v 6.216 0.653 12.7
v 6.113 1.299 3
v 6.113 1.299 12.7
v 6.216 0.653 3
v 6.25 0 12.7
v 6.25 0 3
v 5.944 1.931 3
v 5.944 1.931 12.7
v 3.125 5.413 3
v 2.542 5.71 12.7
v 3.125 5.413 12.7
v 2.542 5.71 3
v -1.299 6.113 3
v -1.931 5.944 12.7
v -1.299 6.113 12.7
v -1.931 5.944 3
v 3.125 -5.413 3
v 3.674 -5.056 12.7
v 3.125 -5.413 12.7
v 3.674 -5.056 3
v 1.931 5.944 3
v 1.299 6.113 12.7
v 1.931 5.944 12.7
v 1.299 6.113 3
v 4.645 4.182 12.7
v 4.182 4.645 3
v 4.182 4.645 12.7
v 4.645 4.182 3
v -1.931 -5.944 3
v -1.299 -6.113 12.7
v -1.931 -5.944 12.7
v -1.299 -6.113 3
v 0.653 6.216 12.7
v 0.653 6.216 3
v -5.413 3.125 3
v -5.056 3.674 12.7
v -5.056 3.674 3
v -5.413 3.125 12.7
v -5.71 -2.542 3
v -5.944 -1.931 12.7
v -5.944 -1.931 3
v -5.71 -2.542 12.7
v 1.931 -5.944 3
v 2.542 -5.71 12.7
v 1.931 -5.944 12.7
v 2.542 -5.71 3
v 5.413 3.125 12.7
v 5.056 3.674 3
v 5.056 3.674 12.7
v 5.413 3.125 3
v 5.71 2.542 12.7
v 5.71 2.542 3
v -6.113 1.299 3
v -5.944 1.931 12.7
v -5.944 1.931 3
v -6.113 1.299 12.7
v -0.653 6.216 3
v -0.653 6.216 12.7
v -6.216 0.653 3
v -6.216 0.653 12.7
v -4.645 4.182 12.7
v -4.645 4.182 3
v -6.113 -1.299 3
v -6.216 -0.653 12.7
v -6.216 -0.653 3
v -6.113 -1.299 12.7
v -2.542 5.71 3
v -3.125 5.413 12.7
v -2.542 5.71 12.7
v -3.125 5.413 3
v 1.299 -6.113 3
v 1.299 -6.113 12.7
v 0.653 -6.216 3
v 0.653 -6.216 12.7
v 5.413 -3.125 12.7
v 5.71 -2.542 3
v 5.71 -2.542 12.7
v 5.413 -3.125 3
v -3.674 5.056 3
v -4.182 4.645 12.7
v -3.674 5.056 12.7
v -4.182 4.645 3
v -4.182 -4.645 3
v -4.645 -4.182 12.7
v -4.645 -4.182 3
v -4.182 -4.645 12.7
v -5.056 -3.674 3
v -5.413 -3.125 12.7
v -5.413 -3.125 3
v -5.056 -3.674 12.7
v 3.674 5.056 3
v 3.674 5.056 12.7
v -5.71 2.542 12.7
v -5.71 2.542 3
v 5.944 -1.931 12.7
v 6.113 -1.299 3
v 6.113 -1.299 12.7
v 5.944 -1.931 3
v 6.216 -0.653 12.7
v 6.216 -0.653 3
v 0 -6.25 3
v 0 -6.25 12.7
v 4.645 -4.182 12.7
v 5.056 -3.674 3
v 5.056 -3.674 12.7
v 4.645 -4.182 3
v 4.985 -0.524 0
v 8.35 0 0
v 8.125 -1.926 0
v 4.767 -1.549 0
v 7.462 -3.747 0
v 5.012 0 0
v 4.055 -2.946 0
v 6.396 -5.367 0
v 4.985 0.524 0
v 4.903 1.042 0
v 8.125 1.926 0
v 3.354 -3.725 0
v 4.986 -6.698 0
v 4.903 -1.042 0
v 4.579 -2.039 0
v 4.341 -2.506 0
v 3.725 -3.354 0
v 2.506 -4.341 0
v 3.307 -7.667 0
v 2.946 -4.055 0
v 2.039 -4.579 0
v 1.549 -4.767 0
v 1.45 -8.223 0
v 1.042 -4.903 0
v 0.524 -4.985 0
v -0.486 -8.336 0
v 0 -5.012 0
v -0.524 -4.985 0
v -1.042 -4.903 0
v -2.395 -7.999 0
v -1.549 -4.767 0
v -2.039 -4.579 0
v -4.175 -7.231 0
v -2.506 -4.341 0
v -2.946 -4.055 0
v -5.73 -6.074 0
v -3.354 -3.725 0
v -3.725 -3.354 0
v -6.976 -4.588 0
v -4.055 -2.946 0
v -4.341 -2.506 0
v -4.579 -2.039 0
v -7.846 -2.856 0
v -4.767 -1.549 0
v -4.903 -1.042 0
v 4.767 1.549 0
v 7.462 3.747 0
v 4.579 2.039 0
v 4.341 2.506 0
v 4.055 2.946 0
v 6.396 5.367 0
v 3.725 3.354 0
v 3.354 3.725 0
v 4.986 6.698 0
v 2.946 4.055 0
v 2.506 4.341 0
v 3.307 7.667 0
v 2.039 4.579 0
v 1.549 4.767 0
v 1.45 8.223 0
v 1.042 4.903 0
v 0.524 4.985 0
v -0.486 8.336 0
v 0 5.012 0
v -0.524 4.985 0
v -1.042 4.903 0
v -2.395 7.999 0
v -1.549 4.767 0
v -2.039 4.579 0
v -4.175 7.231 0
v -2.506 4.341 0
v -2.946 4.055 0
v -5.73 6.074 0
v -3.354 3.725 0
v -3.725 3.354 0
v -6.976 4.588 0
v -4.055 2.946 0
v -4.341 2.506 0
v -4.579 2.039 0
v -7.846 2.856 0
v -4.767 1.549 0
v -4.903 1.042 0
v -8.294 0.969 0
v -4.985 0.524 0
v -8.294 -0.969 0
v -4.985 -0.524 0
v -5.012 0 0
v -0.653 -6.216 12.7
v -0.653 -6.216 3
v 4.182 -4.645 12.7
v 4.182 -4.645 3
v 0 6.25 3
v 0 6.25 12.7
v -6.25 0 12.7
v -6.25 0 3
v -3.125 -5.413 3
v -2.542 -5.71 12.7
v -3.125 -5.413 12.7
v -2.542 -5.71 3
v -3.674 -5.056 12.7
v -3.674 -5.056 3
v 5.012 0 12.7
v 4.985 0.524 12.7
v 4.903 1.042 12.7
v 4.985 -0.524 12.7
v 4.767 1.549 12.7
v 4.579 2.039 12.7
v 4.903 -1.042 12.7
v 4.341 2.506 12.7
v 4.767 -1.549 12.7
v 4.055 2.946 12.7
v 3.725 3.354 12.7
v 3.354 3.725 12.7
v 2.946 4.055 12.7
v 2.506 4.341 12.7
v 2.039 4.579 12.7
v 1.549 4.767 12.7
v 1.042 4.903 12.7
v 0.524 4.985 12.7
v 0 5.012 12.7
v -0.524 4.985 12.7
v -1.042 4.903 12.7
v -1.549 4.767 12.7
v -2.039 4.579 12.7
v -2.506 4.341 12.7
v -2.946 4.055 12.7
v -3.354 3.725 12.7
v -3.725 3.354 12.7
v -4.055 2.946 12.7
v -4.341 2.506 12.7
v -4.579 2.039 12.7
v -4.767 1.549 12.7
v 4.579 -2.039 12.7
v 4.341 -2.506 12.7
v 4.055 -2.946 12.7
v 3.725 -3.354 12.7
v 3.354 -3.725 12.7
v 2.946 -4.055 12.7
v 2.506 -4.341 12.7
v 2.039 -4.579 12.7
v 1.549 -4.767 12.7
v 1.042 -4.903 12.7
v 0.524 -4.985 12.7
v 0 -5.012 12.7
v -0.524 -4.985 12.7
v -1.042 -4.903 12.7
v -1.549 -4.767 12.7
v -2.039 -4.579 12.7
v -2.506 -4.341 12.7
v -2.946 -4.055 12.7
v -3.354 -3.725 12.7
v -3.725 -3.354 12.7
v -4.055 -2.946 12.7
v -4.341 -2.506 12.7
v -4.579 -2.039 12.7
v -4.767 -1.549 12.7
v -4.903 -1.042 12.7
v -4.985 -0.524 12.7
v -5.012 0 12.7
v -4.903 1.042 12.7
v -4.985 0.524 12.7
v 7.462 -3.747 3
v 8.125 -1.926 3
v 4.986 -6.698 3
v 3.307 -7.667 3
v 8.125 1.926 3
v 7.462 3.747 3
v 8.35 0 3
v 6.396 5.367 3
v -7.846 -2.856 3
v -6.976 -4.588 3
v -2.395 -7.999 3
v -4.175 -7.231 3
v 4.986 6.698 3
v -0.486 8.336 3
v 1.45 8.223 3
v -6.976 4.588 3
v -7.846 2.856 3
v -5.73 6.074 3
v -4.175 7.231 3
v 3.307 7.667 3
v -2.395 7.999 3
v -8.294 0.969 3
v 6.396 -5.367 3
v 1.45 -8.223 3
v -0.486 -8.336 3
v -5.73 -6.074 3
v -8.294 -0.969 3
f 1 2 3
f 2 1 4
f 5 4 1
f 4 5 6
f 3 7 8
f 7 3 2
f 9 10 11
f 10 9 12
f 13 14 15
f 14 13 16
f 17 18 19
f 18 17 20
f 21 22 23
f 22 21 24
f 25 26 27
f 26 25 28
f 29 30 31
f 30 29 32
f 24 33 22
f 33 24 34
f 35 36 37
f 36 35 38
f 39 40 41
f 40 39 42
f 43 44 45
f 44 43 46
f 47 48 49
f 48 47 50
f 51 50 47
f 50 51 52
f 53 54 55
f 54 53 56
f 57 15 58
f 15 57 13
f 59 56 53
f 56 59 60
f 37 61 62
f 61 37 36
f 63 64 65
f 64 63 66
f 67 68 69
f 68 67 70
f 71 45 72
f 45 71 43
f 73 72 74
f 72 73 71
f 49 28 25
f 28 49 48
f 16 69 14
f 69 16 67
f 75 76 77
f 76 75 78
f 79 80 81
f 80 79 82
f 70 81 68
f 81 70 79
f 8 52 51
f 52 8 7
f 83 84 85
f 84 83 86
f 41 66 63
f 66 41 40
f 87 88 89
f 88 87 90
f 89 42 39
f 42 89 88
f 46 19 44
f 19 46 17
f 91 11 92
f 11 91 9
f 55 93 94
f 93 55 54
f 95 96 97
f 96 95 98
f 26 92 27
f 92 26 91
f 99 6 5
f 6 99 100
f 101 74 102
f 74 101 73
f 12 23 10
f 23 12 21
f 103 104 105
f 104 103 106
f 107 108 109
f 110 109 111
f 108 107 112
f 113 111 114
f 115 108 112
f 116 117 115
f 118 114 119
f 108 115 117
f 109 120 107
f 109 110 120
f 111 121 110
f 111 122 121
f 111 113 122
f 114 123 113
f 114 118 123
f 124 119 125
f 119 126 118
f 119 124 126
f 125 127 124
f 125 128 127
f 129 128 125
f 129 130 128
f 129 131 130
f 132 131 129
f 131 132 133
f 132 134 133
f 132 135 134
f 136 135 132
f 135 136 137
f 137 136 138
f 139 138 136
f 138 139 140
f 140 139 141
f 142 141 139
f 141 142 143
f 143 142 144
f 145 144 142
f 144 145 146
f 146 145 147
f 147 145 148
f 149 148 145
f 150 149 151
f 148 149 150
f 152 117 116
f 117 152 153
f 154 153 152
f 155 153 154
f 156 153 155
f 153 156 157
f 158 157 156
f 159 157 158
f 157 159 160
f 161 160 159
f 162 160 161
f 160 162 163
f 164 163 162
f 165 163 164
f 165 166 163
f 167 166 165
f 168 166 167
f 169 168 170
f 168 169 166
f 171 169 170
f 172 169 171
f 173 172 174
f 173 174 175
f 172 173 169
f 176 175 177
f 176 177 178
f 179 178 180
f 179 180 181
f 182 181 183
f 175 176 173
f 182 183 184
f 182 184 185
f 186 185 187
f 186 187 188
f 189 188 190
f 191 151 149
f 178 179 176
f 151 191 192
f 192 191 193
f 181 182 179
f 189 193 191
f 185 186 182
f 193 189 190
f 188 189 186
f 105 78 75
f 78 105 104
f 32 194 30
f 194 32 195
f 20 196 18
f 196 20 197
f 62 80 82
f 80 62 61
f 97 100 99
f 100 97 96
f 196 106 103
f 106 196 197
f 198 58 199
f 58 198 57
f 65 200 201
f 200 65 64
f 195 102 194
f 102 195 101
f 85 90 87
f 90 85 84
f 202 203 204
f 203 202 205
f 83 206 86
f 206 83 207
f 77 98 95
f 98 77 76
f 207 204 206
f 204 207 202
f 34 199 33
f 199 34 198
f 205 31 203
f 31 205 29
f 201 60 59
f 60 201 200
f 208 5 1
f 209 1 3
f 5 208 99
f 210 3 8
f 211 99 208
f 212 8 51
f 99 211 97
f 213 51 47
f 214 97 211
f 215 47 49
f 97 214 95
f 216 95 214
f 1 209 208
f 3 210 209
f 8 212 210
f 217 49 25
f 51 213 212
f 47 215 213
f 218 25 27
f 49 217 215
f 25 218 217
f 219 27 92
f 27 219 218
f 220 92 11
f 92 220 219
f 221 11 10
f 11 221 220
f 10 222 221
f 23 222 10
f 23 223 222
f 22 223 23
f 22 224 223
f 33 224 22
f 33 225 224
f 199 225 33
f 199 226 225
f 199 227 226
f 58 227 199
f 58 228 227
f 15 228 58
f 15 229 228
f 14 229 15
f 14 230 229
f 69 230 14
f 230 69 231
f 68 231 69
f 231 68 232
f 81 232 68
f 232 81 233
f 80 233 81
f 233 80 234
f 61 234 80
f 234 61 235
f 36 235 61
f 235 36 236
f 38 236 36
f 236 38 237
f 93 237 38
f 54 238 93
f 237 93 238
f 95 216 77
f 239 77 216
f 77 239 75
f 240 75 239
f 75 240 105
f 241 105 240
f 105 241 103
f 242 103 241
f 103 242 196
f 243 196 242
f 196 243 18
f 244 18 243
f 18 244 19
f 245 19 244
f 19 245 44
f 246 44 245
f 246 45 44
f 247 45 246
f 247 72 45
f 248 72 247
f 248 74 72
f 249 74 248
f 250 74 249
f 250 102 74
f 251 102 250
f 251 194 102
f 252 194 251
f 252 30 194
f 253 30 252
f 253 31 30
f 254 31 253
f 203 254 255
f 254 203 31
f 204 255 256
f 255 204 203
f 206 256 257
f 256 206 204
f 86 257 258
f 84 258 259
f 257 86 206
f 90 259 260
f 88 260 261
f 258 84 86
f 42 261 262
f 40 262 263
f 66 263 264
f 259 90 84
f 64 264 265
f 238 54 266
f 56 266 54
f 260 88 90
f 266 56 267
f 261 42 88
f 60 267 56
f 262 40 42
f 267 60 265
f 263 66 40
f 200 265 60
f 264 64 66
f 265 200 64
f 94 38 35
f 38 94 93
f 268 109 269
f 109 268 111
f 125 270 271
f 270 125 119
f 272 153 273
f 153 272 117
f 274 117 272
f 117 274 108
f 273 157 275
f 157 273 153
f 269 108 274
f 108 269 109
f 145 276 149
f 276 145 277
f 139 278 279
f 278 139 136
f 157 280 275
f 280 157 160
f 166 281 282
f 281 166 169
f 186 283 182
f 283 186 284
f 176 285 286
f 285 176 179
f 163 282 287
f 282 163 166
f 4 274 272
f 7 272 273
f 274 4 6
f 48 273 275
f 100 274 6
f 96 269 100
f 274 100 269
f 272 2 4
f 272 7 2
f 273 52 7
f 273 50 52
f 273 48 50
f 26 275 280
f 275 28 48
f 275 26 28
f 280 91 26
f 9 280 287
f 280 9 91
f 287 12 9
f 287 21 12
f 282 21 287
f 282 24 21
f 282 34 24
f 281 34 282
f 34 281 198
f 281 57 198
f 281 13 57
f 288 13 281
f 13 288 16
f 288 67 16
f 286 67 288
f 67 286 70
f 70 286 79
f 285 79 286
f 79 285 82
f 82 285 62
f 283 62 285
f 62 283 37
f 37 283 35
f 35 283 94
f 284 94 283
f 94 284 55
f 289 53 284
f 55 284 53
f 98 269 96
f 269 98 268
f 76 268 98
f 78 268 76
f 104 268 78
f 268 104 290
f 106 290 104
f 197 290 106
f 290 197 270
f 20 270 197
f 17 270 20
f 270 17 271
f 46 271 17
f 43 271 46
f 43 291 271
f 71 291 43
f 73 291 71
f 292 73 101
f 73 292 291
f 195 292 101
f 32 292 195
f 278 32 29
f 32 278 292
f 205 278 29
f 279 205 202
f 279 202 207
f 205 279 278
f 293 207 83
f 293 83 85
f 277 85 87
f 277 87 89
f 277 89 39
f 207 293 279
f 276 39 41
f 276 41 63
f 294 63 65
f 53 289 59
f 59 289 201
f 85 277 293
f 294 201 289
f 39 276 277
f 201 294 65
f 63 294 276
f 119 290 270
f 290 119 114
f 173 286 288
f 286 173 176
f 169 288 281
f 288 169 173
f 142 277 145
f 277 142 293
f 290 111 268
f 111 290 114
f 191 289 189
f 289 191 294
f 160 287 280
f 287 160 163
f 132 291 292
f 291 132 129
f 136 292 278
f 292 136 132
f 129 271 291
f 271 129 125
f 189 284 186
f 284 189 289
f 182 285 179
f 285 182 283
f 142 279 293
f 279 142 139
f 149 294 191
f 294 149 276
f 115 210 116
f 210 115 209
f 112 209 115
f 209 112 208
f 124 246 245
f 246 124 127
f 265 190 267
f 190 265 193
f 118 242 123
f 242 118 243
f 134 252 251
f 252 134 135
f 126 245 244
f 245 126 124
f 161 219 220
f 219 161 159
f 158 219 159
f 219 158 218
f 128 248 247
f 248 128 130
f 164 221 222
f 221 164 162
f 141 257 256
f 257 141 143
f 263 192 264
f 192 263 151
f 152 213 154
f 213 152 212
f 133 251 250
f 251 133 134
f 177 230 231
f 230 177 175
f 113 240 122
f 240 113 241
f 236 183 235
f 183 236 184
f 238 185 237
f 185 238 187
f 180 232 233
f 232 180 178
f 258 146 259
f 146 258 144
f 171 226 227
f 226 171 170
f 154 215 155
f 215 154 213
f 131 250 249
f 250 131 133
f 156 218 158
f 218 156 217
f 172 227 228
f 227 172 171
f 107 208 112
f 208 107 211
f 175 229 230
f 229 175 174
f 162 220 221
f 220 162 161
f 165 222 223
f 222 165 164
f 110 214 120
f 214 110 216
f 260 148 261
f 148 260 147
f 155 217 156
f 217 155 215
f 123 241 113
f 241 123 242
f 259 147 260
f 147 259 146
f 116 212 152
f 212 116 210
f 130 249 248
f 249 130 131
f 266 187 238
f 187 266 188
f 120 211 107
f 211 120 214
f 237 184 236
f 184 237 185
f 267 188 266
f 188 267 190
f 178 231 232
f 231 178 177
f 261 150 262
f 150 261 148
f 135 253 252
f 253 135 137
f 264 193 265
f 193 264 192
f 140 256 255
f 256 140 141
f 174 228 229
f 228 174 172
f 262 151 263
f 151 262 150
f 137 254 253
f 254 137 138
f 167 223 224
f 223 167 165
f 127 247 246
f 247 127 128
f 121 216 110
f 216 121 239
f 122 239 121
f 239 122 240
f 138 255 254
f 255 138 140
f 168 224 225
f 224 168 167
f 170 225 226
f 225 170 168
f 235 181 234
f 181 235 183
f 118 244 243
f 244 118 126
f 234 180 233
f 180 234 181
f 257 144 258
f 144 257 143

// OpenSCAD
//Title: Dop Stick Holder Adapter
//Author: Alex English - ProtoParadigm
//Date: 8/5/16
//License: Creative Commons - Share Alike - Attribution

//Notes: This is designed to be used with the dop stick holder for lapidary work. It will adapt smaller dop sticks to sit upright in a larger holder hole so that one holder with larger holes can be printed and accommodate a variety of dop stick sizes.

IN=25.4*1; //multiplication by 1 to prevent customizer from presenting this as a configurable value

//Units to use, inches or mm - Make sure to update all dimensional values if you change this
units = "i"; //["i":Inches, "m":Millimeters]

//Diameter of the holes in the holder
hole_diameter = 0.5;
od = units=="i" ? hole_diameter*IN : hole_diameter;

//Diameter of the dop stick
dop_diameter = 0.375;
id = units=="i" ? dop_diameter*IN : dop_diameter;

//Height of the adapter - must be less than the depth of the hole)
height = 0.5;
h = units=="i" ? height*IN : height;

difference()
{
    union()
    {
        cylinder(d=od-0.2,h=h, $fa=6, $fs=0.5);
        cylinder(d=od+4, h=3);
    }
    translate([0, 0, -1]) cylinder(d=id+0.5, h=h+2, $fa=6, $fs=0.5);
}
